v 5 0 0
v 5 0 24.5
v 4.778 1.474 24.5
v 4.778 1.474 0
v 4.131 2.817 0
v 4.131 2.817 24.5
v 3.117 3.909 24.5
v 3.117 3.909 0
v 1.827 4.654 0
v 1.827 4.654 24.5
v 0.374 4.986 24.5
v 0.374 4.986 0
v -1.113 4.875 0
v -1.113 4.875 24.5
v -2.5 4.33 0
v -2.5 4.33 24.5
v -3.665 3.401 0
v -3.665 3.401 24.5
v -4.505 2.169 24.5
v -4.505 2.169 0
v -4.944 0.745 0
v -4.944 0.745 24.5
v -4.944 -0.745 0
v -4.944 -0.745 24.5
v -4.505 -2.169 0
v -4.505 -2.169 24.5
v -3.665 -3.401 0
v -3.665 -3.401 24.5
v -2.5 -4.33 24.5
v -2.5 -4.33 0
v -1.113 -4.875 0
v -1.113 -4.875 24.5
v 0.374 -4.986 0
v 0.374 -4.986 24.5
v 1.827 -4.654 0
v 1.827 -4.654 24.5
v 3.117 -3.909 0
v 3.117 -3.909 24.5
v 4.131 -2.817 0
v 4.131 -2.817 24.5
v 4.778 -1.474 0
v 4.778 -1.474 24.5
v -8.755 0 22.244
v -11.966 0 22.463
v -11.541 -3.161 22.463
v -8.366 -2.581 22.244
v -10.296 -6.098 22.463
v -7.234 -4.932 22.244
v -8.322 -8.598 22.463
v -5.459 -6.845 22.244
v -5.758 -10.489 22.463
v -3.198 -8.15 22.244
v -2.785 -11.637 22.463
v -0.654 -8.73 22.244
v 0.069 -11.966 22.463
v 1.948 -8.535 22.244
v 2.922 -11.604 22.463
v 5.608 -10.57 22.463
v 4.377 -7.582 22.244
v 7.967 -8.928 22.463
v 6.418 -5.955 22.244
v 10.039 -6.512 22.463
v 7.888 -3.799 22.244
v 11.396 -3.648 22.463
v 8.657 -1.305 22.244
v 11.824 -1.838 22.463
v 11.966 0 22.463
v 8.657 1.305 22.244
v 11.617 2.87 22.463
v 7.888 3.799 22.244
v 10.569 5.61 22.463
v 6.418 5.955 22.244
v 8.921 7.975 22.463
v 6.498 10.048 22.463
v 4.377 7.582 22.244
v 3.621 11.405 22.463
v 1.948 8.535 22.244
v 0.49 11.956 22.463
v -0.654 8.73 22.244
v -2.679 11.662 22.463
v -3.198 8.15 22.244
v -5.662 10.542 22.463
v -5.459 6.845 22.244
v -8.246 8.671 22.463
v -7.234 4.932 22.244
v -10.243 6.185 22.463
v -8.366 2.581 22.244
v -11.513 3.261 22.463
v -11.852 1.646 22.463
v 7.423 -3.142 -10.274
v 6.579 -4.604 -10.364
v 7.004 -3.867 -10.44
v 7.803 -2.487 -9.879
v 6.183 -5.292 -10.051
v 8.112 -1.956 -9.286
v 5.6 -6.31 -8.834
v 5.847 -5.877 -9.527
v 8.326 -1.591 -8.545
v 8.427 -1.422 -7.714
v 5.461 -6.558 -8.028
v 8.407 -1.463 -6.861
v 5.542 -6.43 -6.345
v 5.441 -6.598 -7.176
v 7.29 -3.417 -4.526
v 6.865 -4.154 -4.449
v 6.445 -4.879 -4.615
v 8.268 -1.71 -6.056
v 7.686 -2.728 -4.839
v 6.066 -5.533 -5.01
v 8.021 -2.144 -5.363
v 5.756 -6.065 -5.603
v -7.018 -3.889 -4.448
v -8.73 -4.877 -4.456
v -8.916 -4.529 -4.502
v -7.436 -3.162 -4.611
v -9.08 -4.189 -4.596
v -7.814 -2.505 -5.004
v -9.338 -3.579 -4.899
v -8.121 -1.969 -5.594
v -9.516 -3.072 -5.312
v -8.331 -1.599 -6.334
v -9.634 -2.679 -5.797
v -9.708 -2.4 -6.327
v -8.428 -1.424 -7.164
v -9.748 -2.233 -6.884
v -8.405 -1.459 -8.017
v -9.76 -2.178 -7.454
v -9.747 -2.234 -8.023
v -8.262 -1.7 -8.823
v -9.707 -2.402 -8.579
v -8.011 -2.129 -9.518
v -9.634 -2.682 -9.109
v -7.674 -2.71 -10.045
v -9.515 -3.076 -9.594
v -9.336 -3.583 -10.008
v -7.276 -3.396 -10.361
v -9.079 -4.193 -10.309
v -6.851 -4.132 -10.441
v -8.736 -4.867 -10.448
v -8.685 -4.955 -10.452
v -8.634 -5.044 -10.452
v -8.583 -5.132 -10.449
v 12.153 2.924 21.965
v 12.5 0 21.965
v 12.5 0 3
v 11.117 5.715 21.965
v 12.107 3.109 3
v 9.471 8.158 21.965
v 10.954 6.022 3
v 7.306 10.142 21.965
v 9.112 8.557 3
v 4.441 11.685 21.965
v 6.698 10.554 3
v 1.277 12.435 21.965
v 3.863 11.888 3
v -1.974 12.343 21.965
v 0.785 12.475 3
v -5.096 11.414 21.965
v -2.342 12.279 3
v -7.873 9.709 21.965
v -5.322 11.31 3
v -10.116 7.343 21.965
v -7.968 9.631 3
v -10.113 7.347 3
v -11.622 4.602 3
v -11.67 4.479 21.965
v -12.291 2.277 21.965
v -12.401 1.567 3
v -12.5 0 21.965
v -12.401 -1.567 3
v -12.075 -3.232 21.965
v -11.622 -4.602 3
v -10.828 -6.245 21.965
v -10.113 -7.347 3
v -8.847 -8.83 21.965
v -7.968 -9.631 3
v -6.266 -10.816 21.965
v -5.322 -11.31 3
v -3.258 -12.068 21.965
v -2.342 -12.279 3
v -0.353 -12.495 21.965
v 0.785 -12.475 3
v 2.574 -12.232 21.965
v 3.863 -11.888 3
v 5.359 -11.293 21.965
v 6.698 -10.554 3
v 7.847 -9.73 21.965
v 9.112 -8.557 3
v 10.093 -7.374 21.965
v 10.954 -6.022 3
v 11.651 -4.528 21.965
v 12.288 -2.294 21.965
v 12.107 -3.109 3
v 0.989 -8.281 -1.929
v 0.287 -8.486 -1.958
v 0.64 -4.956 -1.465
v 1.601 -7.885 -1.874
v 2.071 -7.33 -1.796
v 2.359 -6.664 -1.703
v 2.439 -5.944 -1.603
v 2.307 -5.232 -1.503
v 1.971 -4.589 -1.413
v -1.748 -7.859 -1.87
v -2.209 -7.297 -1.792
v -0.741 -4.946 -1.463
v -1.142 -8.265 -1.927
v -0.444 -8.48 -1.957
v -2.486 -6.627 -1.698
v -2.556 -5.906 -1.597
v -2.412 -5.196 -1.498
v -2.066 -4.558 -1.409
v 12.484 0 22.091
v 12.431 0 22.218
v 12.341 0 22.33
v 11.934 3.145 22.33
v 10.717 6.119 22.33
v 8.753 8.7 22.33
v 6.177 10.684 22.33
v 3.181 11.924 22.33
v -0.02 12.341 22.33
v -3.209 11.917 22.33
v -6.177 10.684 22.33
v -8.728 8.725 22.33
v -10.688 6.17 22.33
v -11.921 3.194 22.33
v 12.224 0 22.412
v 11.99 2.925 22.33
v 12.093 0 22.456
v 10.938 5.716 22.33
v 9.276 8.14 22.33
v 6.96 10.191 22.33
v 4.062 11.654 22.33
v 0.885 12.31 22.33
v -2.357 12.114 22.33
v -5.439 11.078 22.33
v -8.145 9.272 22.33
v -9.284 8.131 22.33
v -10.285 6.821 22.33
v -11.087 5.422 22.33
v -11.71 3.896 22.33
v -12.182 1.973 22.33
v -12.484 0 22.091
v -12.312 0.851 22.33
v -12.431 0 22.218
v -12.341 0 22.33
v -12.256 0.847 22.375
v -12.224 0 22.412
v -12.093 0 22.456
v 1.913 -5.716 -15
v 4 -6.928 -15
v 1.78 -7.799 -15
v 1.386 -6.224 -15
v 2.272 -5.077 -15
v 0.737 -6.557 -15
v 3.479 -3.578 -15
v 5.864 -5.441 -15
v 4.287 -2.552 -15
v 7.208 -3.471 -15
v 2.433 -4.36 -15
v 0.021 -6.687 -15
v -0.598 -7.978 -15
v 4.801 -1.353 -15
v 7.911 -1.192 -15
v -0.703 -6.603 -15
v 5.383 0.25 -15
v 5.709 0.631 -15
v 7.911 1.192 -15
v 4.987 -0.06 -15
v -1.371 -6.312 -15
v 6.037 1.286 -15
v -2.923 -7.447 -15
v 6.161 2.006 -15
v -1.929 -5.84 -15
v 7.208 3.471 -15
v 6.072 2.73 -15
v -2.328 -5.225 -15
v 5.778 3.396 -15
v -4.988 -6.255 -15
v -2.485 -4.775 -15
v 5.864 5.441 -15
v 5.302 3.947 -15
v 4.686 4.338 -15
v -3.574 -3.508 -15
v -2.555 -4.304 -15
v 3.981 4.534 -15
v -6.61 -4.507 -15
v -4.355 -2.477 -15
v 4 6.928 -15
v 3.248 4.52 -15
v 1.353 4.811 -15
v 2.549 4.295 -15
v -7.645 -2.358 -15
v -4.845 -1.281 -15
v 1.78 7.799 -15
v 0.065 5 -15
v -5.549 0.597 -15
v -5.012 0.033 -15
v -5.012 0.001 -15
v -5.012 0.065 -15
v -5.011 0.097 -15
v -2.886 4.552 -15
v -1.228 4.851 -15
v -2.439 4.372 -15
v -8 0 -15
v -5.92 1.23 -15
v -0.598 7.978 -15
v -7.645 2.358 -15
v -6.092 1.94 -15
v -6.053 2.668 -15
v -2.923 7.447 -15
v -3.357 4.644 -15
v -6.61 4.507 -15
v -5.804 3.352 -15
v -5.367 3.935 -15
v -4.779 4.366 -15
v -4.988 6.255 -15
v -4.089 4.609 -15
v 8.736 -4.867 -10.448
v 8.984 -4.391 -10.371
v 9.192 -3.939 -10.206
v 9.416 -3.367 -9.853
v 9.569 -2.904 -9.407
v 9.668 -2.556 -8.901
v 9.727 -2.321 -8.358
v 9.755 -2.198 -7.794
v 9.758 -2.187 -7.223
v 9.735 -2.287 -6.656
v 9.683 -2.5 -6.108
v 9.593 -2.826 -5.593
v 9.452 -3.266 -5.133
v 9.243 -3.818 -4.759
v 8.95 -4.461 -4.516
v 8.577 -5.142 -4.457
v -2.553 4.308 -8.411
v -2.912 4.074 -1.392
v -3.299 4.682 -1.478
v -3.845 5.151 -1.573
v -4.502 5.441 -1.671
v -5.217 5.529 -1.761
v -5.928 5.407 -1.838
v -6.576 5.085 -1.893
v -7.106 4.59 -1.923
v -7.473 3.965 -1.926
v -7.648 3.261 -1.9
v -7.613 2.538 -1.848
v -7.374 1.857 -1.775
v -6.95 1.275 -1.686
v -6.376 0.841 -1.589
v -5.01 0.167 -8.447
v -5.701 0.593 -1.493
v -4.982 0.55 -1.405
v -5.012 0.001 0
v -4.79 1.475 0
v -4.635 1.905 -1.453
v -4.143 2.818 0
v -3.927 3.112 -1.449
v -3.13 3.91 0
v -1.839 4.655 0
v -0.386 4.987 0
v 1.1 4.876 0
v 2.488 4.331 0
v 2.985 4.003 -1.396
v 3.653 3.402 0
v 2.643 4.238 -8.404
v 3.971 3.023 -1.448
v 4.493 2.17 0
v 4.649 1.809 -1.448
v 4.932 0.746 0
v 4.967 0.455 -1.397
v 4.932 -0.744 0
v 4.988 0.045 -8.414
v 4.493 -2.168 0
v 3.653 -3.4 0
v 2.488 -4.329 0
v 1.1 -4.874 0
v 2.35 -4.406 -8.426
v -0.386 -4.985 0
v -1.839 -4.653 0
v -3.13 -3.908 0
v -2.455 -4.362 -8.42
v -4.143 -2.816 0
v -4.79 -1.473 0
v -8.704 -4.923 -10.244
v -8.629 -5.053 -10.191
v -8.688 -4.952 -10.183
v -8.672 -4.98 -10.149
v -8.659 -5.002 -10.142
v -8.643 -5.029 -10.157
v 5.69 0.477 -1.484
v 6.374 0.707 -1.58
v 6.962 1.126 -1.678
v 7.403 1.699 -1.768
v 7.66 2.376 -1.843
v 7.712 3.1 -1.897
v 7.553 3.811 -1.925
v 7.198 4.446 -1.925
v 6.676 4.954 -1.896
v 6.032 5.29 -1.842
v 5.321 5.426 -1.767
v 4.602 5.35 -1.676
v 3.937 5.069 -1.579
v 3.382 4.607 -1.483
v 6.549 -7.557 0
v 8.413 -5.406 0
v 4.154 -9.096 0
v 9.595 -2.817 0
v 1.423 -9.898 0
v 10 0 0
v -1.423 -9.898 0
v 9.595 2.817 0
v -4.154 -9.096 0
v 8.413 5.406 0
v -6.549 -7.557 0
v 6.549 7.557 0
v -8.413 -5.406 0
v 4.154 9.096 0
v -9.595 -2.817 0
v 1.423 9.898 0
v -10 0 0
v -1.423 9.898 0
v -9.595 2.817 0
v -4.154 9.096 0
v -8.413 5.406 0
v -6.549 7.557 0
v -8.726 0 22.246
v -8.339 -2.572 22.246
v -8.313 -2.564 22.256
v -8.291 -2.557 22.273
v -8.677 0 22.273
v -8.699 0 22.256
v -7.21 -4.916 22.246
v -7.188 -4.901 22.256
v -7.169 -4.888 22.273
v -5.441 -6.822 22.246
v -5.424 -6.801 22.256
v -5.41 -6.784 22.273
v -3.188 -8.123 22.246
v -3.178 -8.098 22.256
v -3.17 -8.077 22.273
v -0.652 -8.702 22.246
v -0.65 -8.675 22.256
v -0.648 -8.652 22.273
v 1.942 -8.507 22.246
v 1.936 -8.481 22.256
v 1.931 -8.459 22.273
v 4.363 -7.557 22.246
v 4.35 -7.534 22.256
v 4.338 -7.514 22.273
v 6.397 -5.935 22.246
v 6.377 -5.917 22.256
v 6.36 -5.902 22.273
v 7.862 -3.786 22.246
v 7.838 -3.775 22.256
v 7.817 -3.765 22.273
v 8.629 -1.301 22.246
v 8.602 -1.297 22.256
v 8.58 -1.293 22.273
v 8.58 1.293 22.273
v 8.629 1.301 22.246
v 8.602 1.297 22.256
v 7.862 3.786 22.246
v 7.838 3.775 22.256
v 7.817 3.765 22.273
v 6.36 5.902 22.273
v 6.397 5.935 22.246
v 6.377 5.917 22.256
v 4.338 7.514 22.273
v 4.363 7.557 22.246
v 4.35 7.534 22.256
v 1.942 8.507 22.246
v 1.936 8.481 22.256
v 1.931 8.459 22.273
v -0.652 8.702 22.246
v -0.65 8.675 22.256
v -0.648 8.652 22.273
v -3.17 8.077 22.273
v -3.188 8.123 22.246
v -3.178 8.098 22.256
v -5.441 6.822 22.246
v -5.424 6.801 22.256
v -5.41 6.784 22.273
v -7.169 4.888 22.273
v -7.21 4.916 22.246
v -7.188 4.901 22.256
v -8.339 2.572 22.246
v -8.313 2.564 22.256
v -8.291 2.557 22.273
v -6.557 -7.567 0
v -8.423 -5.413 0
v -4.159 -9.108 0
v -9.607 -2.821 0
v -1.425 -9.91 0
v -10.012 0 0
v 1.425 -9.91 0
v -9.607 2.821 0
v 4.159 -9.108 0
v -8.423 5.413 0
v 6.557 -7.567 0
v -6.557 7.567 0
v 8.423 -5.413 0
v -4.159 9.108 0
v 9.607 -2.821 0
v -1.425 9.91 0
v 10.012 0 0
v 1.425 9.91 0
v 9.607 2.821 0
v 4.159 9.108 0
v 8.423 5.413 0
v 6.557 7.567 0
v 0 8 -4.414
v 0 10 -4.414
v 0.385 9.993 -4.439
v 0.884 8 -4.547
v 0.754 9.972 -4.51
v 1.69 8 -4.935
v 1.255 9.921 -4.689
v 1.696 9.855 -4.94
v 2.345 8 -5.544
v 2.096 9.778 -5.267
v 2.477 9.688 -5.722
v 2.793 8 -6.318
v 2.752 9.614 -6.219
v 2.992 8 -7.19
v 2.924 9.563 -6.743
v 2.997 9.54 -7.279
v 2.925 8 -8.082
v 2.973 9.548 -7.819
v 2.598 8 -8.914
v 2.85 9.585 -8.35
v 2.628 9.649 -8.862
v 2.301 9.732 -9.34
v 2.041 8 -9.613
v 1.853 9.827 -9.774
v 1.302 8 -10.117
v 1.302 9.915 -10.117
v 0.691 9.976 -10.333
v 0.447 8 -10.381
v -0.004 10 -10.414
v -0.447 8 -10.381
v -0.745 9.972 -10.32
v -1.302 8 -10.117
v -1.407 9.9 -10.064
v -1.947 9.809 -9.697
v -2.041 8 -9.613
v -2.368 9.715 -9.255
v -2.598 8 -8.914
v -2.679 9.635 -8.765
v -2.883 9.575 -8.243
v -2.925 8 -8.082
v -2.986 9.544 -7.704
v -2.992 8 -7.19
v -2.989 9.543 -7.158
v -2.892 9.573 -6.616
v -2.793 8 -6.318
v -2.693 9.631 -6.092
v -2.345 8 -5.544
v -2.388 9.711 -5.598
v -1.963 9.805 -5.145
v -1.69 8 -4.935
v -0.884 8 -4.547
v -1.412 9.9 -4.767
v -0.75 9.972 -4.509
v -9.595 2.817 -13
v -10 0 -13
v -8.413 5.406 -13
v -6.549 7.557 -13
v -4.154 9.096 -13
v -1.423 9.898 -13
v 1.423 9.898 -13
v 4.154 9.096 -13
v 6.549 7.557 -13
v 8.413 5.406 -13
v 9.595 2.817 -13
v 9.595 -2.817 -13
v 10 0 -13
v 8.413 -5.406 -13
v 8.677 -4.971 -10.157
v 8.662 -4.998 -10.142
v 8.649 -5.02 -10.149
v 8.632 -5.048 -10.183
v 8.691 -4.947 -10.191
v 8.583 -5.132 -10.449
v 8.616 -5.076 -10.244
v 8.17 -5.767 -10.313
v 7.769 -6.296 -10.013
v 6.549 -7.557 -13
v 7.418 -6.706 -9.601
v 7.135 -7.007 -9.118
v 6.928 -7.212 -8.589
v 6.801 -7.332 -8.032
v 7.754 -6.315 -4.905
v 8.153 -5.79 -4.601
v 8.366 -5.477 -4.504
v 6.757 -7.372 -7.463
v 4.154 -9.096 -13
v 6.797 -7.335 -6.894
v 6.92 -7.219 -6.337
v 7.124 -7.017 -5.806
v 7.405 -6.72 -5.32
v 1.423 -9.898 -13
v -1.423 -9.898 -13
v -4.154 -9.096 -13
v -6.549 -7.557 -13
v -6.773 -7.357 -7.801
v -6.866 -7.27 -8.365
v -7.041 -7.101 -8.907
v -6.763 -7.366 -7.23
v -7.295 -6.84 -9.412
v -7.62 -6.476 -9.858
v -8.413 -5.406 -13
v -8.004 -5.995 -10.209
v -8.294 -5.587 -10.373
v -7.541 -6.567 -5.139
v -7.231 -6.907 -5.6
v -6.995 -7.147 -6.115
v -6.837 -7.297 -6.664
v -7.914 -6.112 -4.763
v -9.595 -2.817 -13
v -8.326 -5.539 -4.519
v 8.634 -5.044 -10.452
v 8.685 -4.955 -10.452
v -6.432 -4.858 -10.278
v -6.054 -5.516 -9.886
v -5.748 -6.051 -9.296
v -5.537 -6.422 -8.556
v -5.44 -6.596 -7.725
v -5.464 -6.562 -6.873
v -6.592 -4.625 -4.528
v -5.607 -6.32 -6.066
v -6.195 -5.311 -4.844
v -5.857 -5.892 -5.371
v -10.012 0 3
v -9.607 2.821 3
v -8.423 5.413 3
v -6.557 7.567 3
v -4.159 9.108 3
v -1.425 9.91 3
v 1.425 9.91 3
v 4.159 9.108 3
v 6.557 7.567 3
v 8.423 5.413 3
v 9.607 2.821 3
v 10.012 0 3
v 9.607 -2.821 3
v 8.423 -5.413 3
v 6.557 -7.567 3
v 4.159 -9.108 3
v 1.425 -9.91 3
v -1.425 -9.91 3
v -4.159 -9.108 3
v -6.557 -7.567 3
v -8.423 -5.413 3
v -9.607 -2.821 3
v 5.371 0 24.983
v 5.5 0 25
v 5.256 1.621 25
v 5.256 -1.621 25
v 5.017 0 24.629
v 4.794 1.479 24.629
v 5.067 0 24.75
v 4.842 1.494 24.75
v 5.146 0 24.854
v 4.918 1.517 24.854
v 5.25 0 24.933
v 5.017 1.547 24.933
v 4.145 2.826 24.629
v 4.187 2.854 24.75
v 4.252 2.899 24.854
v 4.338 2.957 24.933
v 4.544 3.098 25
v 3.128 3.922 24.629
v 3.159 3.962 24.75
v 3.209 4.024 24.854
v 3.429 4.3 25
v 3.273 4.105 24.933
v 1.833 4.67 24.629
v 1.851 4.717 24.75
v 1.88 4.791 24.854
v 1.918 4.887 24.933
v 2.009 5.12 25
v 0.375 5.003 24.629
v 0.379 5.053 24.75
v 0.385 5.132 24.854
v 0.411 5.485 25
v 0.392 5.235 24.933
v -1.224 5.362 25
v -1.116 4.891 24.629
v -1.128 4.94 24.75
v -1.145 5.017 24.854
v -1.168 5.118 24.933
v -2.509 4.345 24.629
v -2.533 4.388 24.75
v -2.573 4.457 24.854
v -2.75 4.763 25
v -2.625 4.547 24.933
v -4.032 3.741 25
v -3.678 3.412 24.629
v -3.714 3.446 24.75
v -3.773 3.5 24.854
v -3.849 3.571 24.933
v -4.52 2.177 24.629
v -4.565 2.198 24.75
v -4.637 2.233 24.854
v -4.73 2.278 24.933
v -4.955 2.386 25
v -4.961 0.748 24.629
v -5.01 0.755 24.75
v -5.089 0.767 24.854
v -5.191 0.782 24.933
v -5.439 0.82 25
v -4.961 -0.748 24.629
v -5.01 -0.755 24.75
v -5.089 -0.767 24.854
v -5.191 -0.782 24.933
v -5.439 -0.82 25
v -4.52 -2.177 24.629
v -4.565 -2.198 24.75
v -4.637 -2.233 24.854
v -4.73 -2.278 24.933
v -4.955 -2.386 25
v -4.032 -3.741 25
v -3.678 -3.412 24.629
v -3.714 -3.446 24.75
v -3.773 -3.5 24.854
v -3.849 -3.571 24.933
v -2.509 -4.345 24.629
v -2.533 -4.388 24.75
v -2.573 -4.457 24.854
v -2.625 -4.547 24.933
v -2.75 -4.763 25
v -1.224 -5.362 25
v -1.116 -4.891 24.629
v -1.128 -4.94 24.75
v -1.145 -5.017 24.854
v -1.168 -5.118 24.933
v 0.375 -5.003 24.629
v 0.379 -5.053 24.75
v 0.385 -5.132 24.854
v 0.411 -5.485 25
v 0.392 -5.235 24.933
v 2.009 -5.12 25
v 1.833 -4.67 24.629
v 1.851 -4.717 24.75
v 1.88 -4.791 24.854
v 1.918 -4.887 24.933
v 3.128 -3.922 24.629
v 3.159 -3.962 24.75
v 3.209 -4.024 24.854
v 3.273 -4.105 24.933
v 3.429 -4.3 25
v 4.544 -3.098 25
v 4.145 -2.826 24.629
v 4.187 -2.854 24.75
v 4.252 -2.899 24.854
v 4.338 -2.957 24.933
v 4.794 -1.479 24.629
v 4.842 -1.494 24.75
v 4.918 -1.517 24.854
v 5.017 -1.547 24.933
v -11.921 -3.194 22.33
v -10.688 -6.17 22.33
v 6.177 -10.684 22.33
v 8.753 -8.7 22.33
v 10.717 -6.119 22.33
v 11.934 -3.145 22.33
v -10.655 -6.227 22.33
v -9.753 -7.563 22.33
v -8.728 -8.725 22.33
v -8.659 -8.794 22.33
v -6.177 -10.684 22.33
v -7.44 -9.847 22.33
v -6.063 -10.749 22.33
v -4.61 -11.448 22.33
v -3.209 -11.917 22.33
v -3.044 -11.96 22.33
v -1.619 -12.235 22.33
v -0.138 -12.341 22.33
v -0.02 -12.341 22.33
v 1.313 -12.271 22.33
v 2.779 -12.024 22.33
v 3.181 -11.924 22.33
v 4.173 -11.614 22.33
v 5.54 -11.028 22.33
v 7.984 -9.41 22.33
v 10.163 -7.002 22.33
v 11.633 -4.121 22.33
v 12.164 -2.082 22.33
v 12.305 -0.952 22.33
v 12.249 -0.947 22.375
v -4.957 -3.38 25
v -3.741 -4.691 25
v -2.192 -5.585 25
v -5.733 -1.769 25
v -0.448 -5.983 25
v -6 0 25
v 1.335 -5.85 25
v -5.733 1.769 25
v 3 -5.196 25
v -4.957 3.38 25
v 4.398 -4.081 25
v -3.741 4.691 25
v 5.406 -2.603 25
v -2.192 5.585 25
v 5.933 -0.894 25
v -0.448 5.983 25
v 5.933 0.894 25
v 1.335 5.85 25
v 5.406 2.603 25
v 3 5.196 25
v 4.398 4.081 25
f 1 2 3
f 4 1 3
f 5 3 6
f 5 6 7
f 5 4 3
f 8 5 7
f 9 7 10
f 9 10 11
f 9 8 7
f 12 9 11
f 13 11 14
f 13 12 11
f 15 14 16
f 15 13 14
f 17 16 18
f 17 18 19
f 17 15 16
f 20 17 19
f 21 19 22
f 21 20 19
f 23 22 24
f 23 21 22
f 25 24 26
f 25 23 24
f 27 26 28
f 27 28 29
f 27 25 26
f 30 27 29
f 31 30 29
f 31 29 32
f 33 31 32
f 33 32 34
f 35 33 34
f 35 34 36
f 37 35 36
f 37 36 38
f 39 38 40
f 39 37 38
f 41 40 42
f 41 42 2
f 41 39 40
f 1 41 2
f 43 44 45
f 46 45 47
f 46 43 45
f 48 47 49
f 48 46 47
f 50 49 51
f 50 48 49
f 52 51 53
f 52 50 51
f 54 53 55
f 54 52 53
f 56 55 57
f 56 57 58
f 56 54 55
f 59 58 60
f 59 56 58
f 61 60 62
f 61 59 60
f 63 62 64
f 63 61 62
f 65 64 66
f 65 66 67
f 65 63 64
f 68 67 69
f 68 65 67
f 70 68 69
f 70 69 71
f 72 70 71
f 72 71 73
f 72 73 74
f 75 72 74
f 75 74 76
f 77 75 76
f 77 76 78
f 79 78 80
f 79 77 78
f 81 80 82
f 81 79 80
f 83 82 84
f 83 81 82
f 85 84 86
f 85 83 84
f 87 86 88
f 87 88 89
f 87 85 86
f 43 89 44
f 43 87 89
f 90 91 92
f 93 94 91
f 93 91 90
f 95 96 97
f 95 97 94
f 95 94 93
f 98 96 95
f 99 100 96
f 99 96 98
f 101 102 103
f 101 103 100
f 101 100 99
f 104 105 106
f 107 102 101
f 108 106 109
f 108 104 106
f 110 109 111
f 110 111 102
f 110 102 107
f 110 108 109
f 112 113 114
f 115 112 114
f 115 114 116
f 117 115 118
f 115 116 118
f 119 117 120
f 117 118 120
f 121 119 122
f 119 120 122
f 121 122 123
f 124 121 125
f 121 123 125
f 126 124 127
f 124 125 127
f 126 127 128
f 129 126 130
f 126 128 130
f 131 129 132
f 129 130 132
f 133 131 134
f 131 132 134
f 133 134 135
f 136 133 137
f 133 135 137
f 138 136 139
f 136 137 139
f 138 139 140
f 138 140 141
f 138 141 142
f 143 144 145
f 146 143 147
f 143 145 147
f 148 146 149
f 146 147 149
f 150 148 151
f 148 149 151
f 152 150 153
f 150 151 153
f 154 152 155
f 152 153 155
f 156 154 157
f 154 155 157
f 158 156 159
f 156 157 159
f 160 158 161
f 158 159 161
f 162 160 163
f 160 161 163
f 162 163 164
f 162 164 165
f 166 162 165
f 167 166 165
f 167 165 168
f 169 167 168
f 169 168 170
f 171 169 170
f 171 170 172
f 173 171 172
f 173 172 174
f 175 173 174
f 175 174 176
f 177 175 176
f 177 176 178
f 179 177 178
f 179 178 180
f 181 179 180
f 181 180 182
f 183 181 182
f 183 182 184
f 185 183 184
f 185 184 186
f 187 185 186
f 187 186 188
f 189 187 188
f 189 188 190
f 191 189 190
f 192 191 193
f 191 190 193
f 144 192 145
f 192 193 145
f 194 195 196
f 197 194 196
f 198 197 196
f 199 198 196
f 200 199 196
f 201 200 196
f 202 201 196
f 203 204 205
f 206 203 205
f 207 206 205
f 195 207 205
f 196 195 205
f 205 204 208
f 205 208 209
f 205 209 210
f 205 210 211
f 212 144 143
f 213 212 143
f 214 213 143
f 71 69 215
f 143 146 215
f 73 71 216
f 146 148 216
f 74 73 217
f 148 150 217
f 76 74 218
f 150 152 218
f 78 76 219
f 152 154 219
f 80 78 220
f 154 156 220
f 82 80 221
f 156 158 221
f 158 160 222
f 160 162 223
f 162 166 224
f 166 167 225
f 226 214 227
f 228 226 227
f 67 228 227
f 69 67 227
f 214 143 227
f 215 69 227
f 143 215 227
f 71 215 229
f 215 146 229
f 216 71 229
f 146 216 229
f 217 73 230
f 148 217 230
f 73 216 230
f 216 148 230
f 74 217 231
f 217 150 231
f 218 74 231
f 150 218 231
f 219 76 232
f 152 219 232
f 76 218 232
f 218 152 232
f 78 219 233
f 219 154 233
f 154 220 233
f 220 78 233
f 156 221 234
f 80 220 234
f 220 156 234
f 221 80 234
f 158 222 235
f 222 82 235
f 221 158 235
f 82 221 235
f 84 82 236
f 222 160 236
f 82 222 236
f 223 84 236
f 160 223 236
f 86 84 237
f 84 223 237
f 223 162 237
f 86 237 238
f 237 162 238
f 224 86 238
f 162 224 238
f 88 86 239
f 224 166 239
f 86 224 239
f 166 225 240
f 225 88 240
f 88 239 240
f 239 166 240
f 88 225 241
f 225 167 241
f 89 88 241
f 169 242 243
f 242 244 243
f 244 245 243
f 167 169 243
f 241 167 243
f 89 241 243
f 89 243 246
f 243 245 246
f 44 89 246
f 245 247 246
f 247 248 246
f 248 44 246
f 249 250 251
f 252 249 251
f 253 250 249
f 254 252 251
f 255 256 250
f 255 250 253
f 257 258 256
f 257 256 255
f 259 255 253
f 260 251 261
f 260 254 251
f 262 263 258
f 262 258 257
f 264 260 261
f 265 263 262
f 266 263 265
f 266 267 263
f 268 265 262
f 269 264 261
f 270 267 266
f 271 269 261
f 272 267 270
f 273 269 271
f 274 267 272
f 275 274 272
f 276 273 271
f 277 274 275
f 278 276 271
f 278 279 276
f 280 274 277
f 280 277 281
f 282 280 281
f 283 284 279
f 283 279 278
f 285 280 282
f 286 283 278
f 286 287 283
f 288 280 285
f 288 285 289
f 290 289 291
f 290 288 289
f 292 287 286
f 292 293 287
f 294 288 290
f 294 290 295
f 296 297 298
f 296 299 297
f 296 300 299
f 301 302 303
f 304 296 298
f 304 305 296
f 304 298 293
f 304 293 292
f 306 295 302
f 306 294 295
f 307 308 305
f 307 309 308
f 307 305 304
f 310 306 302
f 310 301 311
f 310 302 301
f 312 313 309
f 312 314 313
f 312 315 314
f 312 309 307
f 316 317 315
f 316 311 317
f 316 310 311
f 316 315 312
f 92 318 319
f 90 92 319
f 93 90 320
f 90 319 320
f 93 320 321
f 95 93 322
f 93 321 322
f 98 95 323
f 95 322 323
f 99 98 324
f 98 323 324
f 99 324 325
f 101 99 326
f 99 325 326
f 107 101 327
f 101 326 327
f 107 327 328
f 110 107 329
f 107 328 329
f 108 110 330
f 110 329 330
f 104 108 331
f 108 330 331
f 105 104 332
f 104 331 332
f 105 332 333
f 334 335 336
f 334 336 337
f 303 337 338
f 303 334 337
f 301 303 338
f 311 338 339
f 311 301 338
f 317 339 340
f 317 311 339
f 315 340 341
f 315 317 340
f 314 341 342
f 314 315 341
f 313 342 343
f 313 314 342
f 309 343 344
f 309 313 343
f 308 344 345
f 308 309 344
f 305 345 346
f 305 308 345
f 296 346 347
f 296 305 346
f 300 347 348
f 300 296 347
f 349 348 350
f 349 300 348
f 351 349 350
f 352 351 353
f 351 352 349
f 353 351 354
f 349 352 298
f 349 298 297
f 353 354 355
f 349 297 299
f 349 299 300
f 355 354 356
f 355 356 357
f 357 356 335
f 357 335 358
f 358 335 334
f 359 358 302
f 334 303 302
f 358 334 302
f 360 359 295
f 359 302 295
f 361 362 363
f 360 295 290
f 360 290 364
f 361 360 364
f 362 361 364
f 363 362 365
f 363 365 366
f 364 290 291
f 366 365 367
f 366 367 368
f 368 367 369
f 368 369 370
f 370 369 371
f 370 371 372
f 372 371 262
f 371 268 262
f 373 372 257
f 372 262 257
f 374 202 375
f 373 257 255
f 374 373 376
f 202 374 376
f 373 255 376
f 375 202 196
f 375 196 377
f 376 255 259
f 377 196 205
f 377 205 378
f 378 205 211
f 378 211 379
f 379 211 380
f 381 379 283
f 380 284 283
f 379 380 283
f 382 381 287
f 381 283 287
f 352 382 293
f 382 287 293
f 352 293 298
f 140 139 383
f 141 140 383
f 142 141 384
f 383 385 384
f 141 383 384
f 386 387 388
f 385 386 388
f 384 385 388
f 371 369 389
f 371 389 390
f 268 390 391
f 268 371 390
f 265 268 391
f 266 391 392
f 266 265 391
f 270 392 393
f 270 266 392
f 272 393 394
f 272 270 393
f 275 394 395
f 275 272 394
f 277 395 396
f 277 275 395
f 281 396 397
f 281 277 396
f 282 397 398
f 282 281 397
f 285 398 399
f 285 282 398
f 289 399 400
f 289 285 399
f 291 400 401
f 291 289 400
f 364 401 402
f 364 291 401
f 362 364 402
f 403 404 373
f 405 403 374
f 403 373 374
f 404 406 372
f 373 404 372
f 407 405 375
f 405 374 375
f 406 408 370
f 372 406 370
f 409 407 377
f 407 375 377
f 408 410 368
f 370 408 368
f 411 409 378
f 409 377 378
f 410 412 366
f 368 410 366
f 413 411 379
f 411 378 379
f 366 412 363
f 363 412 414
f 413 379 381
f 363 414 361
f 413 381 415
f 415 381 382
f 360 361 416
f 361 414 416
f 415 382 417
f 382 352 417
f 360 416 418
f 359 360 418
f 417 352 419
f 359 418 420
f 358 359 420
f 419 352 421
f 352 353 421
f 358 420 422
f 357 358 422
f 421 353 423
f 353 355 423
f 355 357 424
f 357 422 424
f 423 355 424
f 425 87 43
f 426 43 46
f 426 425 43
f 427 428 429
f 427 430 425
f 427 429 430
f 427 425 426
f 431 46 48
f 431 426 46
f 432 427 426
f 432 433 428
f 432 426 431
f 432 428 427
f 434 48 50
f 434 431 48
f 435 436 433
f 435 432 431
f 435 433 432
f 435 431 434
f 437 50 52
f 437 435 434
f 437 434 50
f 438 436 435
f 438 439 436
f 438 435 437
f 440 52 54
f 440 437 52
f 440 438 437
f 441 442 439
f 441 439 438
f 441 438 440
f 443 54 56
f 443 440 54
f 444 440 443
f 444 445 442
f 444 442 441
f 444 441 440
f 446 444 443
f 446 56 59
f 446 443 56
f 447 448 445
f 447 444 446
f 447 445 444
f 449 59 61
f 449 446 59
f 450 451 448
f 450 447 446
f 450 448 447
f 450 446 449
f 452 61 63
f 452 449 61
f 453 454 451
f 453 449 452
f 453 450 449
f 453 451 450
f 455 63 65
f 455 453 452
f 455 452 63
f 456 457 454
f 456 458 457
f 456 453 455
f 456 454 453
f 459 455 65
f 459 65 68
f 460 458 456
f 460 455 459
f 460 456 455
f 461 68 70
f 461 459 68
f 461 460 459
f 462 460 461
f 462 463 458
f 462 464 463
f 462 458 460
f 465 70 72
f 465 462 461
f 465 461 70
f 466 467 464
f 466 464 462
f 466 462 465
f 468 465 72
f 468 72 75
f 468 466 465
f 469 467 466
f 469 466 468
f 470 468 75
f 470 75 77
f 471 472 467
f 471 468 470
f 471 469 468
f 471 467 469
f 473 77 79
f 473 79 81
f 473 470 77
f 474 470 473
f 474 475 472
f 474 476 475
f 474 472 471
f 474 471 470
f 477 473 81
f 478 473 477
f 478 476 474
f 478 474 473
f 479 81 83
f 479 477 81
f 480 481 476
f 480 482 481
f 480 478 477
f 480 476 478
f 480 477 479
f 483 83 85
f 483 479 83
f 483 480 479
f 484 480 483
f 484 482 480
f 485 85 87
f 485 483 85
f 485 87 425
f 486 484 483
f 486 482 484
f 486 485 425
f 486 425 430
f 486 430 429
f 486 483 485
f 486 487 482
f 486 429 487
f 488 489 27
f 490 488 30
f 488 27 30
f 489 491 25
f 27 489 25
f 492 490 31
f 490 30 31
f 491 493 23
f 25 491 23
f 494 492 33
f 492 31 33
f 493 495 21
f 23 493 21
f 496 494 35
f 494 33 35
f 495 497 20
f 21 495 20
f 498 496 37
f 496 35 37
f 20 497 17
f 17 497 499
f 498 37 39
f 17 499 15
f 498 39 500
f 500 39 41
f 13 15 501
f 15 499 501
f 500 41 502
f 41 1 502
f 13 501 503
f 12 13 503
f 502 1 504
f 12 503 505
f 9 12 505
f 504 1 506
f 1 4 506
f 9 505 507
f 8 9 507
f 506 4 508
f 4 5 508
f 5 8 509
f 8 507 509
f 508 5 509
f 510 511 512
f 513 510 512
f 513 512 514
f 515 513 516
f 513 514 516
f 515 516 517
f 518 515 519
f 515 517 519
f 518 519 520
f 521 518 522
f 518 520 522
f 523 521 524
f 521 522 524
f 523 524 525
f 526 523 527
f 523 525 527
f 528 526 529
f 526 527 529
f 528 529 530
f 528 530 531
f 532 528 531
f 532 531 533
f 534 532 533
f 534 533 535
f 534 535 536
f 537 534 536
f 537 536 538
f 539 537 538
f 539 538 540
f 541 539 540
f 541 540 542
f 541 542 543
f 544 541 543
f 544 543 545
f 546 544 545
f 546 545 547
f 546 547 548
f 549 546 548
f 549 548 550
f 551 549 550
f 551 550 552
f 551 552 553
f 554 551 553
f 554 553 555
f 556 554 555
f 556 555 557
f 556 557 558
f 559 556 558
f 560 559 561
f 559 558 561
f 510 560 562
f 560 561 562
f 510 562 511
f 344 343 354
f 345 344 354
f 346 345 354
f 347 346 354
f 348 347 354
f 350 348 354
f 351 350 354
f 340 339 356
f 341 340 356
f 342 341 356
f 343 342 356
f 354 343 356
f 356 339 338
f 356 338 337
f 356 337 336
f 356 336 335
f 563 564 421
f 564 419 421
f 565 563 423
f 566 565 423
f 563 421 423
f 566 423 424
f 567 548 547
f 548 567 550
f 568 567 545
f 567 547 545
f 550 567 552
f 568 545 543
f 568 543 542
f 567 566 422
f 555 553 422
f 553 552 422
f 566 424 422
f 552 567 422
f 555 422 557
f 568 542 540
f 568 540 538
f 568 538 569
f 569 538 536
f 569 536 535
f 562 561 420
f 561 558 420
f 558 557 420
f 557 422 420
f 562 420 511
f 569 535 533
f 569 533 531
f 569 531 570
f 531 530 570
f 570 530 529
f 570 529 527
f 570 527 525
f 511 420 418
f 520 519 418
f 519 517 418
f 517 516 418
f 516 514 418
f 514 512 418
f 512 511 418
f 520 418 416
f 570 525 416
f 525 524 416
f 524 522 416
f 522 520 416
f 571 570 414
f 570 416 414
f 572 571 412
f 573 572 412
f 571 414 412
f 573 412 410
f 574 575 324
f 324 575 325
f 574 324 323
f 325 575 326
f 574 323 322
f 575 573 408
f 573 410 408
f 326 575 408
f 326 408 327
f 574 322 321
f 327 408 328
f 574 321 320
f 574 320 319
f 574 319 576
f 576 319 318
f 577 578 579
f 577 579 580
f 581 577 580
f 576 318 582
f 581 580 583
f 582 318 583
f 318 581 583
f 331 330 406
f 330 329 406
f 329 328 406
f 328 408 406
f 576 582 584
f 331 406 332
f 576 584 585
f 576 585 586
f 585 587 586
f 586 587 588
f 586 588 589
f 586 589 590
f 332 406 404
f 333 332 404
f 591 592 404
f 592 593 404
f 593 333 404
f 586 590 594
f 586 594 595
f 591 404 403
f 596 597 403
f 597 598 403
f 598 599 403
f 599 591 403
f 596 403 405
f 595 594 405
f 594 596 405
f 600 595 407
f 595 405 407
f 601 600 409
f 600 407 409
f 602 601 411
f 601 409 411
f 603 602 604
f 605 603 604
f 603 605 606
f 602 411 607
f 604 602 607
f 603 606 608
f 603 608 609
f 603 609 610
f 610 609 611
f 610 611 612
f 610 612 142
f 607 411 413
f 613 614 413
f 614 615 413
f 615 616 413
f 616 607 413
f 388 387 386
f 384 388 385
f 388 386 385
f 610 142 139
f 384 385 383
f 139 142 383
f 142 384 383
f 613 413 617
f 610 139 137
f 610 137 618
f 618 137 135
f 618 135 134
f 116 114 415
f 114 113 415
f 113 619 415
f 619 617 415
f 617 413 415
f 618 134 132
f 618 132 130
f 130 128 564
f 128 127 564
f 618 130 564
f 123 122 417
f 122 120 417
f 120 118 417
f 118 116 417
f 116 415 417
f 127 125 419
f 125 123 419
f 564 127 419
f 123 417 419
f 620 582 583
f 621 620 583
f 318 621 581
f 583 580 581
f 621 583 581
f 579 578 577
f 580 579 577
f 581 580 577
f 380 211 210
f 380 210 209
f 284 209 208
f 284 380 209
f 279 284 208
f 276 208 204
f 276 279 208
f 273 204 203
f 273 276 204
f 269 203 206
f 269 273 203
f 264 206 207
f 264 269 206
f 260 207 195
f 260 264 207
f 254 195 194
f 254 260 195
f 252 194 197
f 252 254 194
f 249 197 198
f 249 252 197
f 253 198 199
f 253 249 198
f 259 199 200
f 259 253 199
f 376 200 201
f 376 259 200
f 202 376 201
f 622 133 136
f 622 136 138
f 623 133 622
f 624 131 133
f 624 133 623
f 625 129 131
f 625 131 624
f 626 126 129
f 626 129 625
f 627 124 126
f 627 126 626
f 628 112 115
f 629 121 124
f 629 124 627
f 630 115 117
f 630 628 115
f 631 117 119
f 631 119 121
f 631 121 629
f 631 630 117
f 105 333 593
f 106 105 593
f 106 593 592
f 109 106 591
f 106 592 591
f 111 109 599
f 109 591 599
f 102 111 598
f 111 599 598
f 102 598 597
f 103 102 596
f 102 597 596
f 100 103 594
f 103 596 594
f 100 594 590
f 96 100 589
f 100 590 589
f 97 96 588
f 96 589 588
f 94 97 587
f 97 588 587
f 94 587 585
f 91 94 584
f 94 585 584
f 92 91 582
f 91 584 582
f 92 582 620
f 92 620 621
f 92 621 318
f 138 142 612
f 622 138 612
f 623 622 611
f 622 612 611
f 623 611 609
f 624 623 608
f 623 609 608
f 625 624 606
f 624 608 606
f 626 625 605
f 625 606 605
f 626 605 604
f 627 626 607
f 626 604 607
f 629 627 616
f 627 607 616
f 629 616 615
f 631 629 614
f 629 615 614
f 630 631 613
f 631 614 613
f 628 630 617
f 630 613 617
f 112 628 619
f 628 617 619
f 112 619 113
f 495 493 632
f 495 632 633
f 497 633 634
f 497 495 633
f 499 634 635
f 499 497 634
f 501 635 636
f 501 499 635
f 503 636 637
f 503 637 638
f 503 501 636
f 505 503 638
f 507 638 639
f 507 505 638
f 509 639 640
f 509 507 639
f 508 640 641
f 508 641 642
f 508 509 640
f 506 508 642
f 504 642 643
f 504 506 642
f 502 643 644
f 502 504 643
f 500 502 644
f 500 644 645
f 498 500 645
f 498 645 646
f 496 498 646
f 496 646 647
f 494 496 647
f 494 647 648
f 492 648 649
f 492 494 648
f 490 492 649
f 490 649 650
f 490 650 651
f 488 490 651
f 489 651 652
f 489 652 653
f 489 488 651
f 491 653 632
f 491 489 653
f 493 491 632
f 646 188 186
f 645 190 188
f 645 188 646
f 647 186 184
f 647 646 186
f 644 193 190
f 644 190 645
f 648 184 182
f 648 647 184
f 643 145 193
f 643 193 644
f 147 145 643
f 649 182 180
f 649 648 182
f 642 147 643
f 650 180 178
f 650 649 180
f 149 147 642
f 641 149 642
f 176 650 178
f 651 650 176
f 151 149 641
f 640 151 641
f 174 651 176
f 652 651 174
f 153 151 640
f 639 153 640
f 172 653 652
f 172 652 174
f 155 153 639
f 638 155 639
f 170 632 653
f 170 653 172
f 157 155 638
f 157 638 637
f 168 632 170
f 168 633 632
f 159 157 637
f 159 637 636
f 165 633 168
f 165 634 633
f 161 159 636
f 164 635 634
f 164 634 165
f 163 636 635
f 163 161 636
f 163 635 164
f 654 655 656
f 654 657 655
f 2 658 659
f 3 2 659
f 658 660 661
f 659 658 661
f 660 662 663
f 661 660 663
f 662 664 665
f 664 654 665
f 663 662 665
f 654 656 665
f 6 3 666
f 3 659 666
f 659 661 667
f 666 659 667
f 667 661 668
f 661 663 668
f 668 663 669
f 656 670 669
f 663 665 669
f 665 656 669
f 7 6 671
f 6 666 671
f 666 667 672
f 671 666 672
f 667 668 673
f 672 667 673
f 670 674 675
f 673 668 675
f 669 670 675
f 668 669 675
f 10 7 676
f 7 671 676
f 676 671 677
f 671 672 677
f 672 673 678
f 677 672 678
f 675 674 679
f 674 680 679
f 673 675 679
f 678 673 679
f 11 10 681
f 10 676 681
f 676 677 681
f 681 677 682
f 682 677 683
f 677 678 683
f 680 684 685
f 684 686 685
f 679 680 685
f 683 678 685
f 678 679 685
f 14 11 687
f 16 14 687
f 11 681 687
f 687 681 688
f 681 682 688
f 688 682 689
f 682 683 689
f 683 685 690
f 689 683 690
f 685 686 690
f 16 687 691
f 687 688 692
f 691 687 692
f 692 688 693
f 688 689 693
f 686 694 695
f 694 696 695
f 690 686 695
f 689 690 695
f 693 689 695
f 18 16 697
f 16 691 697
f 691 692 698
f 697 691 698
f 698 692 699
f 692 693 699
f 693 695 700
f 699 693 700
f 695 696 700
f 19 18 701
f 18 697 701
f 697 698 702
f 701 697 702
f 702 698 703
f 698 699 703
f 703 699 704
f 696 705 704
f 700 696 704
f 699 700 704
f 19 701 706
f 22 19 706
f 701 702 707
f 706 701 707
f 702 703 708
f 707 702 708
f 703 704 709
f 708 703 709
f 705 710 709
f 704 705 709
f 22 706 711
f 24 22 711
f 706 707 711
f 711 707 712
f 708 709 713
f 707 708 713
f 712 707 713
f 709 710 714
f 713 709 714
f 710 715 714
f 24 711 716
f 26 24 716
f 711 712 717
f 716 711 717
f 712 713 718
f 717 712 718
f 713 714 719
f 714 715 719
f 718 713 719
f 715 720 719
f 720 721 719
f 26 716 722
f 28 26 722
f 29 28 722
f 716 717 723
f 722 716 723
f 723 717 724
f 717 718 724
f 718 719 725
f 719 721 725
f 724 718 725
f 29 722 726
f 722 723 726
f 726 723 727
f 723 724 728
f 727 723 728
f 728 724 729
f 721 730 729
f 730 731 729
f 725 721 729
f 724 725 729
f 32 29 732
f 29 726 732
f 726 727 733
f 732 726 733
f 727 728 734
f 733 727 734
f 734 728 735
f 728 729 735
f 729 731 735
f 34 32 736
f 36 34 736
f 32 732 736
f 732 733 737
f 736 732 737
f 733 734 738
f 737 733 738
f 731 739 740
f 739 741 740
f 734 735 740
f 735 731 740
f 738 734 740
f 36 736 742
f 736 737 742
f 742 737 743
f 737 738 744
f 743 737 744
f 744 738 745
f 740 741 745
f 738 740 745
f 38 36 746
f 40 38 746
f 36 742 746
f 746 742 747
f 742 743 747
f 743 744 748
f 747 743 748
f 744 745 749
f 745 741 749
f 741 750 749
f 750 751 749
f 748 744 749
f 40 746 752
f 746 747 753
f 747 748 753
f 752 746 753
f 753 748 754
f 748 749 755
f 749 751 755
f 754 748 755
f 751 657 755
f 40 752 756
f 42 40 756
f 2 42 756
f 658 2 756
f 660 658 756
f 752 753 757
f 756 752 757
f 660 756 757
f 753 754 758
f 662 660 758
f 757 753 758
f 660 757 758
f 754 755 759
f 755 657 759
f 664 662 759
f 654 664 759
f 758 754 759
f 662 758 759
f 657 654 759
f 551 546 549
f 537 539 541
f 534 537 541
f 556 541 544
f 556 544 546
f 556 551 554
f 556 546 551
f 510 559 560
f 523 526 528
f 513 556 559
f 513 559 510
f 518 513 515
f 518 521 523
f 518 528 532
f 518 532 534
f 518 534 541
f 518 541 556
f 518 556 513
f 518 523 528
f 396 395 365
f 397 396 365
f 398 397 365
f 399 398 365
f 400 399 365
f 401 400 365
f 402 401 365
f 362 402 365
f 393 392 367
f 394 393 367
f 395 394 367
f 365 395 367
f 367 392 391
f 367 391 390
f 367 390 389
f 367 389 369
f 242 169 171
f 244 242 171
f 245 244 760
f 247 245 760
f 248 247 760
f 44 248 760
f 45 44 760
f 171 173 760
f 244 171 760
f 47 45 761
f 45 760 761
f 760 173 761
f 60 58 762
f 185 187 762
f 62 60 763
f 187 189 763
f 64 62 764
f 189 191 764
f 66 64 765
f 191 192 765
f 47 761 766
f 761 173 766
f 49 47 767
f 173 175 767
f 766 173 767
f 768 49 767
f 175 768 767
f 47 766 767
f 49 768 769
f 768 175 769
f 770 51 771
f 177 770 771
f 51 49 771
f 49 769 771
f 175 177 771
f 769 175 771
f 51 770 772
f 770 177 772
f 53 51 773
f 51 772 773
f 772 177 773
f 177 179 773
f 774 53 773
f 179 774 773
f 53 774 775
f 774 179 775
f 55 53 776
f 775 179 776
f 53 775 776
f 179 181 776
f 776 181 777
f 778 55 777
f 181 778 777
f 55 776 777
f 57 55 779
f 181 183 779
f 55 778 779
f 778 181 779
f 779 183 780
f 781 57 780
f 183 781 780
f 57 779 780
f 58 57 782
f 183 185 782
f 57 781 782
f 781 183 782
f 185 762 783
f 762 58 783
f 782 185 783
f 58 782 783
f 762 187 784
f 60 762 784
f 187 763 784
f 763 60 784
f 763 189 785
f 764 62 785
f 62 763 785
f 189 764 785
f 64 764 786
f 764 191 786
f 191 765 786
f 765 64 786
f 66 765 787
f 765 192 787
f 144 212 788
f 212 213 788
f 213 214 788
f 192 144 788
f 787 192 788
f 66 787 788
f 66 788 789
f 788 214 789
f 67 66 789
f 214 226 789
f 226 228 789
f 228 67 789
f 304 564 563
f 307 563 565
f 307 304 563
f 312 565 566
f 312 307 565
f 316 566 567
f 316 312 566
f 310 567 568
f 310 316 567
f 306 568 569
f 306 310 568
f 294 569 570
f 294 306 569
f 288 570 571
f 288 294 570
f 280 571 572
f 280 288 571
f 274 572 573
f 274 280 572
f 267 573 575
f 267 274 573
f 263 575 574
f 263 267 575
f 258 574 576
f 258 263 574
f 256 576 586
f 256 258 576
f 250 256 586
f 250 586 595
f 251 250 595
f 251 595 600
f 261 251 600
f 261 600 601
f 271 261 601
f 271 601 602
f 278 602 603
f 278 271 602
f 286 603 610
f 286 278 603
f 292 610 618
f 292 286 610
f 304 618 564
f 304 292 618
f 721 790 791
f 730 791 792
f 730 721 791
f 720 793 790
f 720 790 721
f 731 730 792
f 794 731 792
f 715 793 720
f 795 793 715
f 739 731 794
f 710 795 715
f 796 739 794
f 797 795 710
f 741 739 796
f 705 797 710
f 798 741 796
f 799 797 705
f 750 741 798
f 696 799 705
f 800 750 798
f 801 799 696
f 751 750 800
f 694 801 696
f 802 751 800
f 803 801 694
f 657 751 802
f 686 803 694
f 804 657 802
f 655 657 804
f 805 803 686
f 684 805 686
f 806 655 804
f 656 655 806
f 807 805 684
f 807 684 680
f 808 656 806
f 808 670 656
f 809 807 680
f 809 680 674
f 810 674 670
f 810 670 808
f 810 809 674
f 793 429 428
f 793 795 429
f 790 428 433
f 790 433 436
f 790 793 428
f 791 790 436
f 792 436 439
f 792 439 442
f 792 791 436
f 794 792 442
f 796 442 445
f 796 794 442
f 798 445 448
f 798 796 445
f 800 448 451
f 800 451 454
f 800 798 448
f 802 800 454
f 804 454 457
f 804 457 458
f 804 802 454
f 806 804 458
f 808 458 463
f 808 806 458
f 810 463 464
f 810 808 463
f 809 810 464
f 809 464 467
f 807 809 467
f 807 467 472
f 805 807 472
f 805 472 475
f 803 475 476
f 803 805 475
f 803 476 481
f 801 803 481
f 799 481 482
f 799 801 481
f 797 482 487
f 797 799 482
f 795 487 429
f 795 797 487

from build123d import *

# Parameters (mm, degrees)
SKETCH1_R           = 12.5
SKETCH1_R_2         = 5
BOSS_EXTRUDE1_DEPTH = 25
FILLET1_R           = 0.5
SKETCH3_R           = 10
BOSS_EXTRUDE2_DEPTH = 15
CHAMFER1_SIZE       = 2
SKETCH8_R           = 2.5
CUT_EXTRUDE1_DEPTH  = 24
CIRPATTERN1_COUNT   = 3
SKETCH6_R           = 5
CUT_EXTRUDE2_DEPTH  = 15
SKETCH5_R           = 3
CUT_EXTRUDE3_DEPTH  = 2
SKETCH9_R           = 12.50649661
SKETCH9_R_2         = 10.012344617
CUT_EXTRUDE4_DEPTH  = 3


with BuildPart() as part:
    # Sketch1 → Boss-Extrude1 (new body)
    with BuildSketch(Plane.XY):
        Circle(SKETCH1_R)
        Circle(SKETCH1_R_2, mode=Mode.SUBTRACT)
    extrude(amount=BOSS_EXTRUDE1_DEPTH)

    # Sketch2 → Cut-Revolve1 (revolve, cut)
    with BuildSketch(Plane(origin=(0, 0, 0), x_dir=(0, 0, -1), z_dir=(1, 0, 0)), mode=Mode.PRIVATE) as cut_revolve1_sk:
        with BuildLine():
            Line((-25, 12.5), (-22.5, 12.5))
            Line((-22.5, 12.5), (-22.243655425, 8.754806092))
            ThreePointArc((-22.243655425, 8.754806092), (-22.249944012, 8.712454692), (-22.273368866, 8.676615278))
            Line((-22.273368866, 8.676615278), (-25, 6))
            Line((-25, 6), (-25, 12.5))
        make_face()
    revolve(cut_revolve1_sk.sketch.rotate(Axis((0, 0, 0.001410909), (0, 0, 1)), 90), axis=Axis((0, 0, 0.001410909), (0, 0, 1)), mode=Mode.SUBTRACT)

    # Fillet1
    fillet1_edges = [part.edges().sort_by_distance(p)[0] for p in [
        (0, -12.5, 22.5),
        (-5, 0, 25),
    ]]
    fillet(fillet1_edges, radius=FILLET1_R)

    # Sketch9 → Cut-Extrude4 (cut)
    with BuildSketch(Plane(origin=(0, 0, 0), x_dir=(-1, 0, 0), z_dir=(0, 0, -1))):
        Circle(SKETCH9_R)
        Circle(SKETCH9_R_2, mode=Mode.SUBTRACT)
    extrude(amount=-CUT_EXTRUDE4_DEPTH, mode=Mode.SUBTRACT)


with BuildPart() as body_2:
    # Sketch3 → Boss-Extrude2 (new body)
    with BuildSketch(Plane(origin=(0, 0, 0), x_dir=(-1, 0, 0), z_dir=(0, 0, -1))):
        Circle(SKETCH3_R)
    extrude(amount=BOSS_EXTRUDE2_DEPTH)

    # Chamfer1
    chamfer1_edges = [body_2.edges().sort_by_distance(p)[0] for p in [
        (10, 0, -15),
    ]]
    chamfer(chamfer1_edges, length=CHAMFER1_SIZE)

    # Sketch8 → Cut-Extrude1 (cut)
    with BuildSketch(Plane(origin=(0, 0.037926228, -25), x_dir=(1, 0, 0), z_dir=(0, -0.138325230756588, 0.9903868590283985))):
        with Locations(Location((-0.058992617, -2.778294742, 0), (0, 0, 90))):
            Circle(SKETCH8_R)
    cut_extrude1 = extrude(amount=CUT_EXTRUDE1_DEPTH, mode=Mode.SUBTRACT)

    # CirPattern1: Cut-Extrude1 ×3 about axis
    cirpattern1_axis = Axis((0, -0.013059311, -5), (0, 0.0025492686554308094, -0.999996750609382))
    for i in range(1, CIRPATTERN1_COUNT):
        add(cut_extrude1.rotate(cirpattern1_axis, i * 360 / CIRPATTERN1_COUNT), mode=Mode.SUBTRACT)

    # Sketch6 → Cut-Extrude2 (cut)
    with BuildSketch(Plane(origin=(0, 0, -15), x_dir=(-1, 0, 0), z_dir=(0, 0, -1))):
        with Locations((0.012275783, 0.001033832)):
            Circle(SKETCH6_R)
    extrude(amount=-CUT_EXTRUDE2_DEPTH, mode=Mode.SUBTRACT)

    # Sketch5 → Cut-Extrude3 (cut)
    with BuildSketch(Plane(origin=(0, 10, 0), x_dir=(1, 0, 0), z_dir=(0, 1, 0))):
        with Locations(Location((0, 7.414094895, 0), (0, 0, 270))):
            Circle(SKETCH5_R)
    extrude(amount=-CUT_EXTRUDE3_DEPTH, mode=Mode.SUBTRACT)

    # CirPattern2: read off the stored shape, not the designer's step
    # CirPattern2: loft between two sections, ruled curve by curve
    cirpattern2_from = [
        Edge.make_three_point_arc((-6.850635196, -4.132036407, -10.441076683), (-5.436473367, -6.605518147, -7.297506356), (-7.01768621, -3.888522832, -4.448348164)),
        Edge.make_three_point_arc((-7.01768621, -3.888522832, -4.448348164), (-8.431848039, -1.415041091, -7.591918491), (-6.850635196, -4.132036407, -10.441076683)),
    ]
    cirpattern2_to = [
        Edge.make_three_point_arc((-8.582680376, -5.13201691, -10.448724464), (-7.168518547, -7.605498651, -7.305154137), (-8.749731389, -4.888503336, -4.455995946)),
        Edge.make_three_point_arc((-8.749731389, -4.888503336, -4.455995946), (-10.163893219, -2.415021595, -7.599566272), (-8.582680376, -5.13201691, -10.448724464)),
    ]
    cirpattern2 = Solid(Shell([*[Face.make_surface_from_curves(cirpattern2_from[k], cirpattern2_to[k]) for k in range(2)], Face(Wire(cirpattern2_from)), Face(Wire(cirpattern2_to))]))
    add(cirpattern2, mode=Mode.SUBTRACT)

    # CirPattern2 2: loft between two sections, ruled curve by curve
    cirpattern2_2_from = [
        Edge.make_three_point_arc((7.003747149, -3.866839031, -10.440473183), (8.43256038, -1.41614922, -7.285697089), (6.864574257, -4.153720208, -4.448951665)),
        Edge.make_three_point_arc((6.864574257, -4.153720208, -4.448951665), (5.435761026, -6.604410019, -7.603727758), (7.003747149, -3.866839031, -10.440473183)),
    ]
    cirpattern2_2_to = [
        Edge.make_three_point_arc((8.735792329, -4.866819535, -10.448120964), (10.16460556, -2.416129723, -7.29334487), (8.596619436, -5.153700711, -4.456599446)),
        Edge.make_three_point_arc((8.596619436, -5.153700711, -4.456599446), (7.167806205, -7.604390523, -7.611375539), (8.735792329, -4.866819535, -10.448120964)),
    ]
    cirpattern2_2 = Solid(Shell([*[Face.make_surface_from_curves(cirpattern2_2_from[k], cirpattern2_2_to[k]) for k in range(2)], Face(Wire(cirpattern2_2_from)), Face(Wire(cirpattern2_2_to))]))
    add(cirpattern2_2, mode=Mode.SUBTRACT)


solid = Compound([part.part, body_2.part])
